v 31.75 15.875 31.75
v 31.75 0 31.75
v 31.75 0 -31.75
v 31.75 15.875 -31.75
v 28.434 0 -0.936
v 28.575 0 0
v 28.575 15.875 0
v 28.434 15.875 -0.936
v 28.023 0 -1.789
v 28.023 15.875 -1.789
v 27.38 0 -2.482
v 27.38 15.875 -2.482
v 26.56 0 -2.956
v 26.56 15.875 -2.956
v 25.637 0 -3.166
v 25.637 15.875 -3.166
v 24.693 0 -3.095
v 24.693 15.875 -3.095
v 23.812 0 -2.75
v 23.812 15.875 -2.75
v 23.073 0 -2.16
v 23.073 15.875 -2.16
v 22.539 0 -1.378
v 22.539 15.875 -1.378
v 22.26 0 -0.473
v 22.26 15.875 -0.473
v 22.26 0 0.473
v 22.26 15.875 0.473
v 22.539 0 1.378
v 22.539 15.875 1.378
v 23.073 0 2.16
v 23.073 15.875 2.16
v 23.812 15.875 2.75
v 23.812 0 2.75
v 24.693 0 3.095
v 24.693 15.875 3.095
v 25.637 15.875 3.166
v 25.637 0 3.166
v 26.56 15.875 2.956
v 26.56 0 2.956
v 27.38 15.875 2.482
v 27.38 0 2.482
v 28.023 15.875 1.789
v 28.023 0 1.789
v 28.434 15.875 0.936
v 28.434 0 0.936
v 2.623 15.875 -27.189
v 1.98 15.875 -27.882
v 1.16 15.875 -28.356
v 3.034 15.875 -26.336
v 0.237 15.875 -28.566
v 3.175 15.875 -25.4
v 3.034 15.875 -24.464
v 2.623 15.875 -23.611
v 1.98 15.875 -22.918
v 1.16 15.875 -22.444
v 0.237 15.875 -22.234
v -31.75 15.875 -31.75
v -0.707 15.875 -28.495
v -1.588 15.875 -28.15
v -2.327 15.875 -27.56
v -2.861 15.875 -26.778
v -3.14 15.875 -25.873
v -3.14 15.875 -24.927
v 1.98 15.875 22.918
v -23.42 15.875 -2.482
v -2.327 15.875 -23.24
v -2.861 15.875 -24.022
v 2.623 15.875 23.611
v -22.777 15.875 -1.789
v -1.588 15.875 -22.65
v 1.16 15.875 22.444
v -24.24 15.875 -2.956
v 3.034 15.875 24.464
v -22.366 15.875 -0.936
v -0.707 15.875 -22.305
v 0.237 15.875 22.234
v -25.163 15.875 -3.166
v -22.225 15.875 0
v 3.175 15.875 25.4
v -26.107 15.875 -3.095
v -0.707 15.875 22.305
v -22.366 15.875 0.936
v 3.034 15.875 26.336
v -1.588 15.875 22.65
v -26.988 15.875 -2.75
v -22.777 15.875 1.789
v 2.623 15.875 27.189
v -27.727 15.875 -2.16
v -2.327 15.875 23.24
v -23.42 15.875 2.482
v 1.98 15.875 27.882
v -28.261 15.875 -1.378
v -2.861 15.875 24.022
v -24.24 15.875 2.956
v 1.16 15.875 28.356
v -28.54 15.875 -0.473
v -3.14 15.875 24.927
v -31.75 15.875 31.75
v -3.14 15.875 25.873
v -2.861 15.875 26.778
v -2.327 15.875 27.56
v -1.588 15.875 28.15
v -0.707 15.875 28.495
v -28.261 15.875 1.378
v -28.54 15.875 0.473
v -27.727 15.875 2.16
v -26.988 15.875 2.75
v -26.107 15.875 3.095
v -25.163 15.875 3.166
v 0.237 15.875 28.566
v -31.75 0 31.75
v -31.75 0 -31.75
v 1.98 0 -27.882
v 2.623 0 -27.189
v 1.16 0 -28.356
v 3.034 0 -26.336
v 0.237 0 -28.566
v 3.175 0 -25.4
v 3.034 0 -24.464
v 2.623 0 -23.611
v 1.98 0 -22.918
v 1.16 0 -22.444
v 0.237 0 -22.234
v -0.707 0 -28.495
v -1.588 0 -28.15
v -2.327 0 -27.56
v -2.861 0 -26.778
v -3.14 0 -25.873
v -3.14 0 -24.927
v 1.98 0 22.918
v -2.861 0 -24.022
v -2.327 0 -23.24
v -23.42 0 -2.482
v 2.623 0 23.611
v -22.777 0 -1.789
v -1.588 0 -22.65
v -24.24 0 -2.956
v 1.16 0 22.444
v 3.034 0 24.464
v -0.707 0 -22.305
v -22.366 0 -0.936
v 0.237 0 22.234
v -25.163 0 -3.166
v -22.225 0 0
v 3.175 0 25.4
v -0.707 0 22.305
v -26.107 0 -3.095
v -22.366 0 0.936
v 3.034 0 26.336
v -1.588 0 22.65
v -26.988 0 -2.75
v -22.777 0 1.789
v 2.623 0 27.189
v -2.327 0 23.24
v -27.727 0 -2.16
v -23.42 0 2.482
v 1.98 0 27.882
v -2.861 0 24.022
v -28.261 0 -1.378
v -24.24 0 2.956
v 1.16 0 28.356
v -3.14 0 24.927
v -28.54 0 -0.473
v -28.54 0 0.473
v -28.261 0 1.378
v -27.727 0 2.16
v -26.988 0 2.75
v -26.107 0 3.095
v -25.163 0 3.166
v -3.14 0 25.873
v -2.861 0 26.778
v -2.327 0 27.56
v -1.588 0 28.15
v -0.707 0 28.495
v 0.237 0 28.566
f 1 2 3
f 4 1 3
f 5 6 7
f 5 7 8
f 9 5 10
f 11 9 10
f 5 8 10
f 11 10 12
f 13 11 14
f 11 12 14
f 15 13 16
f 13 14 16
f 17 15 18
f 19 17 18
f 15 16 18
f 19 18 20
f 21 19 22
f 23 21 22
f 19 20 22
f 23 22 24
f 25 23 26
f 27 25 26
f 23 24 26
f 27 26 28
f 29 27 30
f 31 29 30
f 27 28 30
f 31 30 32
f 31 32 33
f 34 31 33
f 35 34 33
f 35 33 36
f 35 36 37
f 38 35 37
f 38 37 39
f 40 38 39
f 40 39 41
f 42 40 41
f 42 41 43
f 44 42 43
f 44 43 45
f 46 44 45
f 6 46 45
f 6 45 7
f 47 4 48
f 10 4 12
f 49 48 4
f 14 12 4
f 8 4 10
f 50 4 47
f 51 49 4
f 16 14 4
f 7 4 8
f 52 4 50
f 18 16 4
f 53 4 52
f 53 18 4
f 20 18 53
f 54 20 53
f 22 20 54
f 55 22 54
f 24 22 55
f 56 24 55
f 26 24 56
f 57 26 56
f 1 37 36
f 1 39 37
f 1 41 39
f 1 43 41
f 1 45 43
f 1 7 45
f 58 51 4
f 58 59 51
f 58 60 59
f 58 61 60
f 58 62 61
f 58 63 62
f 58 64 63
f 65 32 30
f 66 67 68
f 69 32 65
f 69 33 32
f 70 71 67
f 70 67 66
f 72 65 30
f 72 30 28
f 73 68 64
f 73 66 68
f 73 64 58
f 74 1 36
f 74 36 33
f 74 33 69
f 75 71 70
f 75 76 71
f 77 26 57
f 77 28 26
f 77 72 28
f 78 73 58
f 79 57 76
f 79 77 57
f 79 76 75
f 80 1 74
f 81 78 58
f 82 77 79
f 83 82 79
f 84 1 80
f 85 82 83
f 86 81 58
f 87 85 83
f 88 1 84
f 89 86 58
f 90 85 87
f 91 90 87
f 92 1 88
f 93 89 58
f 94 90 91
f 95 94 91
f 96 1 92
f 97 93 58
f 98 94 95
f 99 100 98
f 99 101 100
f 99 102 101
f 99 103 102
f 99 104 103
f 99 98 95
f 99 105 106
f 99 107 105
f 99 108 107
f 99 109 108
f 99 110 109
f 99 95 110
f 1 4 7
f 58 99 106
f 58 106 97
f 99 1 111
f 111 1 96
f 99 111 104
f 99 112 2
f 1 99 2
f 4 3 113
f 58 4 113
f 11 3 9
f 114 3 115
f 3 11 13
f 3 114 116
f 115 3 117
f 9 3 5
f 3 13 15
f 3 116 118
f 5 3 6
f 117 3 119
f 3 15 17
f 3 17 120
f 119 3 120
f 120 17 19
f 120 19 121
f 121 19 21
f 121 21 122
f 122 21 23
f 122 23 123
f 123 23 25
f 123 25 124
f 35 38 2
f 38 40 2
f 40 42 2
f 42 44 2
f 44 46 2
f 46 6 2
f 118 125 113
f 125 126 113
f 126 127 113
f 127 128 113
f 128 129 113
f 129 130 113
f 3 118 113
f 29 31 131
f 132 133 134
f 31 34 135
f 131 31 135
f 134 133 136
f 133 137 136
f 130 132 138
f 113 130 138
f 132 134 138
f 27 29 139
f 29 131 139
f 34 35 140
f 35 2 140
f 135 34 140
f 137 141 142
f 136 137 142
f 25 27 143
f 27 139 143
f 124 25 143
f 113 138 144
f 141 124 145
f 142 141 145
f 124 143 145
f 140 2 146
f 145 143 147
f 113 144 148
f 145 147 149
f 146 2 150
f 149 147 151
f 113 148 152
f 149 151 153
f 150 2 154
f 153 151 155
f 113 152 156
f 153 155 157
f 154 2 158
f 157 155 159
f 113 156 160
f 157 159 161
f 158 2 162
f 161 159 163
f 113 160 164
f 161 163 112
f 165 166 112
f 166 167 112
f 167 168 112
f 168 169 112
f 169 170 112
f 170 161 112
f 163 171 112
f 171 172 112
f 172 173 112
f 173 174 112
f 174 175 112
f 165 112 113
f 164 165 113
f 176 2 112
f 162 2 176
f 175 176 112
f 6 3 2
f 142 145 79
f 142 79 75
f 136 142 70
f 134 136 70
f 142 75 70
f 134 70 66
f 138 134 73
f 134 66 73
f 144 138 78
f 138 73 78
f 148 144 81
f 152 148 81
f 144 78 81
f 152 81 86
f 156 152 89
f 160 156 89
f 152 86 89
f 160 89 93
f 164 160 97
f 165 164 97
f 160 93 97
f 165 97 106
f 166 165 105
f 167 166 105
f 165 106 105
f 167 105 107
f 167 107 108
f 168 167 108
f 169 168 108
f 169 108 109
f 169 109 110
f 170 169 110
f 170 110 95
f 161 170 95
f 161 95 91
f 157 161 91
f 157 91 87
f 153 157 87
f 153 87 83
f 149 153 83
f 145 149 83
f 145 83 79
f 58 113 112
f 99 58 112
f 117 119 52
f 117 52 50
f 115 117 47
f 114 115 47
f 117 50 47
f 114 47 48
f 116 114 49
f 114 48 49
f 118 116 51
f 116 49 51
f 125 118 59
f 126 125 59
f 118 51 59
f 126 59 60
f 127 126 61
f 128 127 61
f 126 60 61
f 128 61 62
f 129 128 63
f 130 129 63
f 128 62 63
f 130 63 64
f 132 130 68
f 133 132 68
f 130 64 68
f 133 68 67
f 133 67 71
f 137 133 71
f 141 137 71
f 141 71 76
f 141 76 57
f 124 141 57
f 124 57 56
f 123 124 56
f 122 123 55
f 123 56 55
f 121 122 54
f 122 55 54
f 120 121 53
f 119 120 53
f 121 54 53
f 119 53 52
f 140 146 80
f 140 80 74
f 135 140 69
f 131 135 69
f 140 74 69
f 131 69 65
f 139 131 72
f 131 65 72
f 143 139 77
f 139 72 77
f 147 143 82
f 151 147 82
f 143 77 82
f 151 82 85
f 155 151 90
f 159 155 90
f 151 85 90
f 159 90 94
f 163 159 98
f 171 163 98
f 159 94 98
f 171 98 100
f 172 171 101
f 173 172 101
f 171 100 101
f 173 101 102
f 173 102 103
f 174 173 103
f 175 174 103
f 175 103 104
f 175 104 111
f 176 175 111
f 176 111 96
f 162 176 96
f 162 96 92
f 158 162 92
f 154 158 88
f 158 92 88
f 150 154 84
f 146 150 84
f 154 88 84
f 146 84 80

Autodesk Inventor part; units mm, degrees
ref_plane "YZ Plane" through (0, 0, 0) normal (1, 0, 0) x (0, 1, 0)
ref_plane "XZ Plane" through (0, 0, 0) normal (0, 1, 0) x (-1, 0, 0)
ref_plane "XY Plane" through (0, 0, 0) normal (0, 0, 1) x (1, 0, 0)
sketch "Sketch1" plane through (0, 0, 0) normal (0, 1, 0) x (-1, 0, 0)
  circle A0 centre (0, 0) radius 31.75
  line L0 (-31.75, -31.75) -> (31.75, -31.75)
  line L1 (31.75, -31.75) -> (31.75, 31.75)
  line L2 (31.75, 31.75) -> (-31.75, 31.75)
  line L3 (-31.75, 31.75) -> (-31.75, -31.75)
  line L4 (-31.75, -31.75) -> (31.75, 31.75) construction
  line L5 (31.75, -31.75) -> (-31.75, 31.75) construction
  point P0 (-31.75, 0)
  point P1 (0, 31.75)
  point P2 (0, -31.75)
  point P3 (31.75, 0)
  dimension "d0" = 63.5
extrude "Extrusion1" add sketch "Sketch1" along normal blind 15.875
sketch "Sketch2" plane through (0, 15.875, 0) normal (0, 1, 0) x (1, 0, 0)
  circle A0 centre (25.4, 0) radius 3.175
  circle A1 centre (0, 25.4) radius 3.175
  circle A2 centre (-25.4, 0) radius 3.175
  circle A3 centre (0, -25.4) radius 3.175
  point P0 (0, 0)
  dimension "d3" = 6.35
  dimension "d6" = 0
  dimension "d7" = 25.4
  dimension "d10" = 360
extrude "Extrusion2" cut sketch "Sketch2" against normal blind 50.8
properties part number "FrontPlatePostNoKey"
